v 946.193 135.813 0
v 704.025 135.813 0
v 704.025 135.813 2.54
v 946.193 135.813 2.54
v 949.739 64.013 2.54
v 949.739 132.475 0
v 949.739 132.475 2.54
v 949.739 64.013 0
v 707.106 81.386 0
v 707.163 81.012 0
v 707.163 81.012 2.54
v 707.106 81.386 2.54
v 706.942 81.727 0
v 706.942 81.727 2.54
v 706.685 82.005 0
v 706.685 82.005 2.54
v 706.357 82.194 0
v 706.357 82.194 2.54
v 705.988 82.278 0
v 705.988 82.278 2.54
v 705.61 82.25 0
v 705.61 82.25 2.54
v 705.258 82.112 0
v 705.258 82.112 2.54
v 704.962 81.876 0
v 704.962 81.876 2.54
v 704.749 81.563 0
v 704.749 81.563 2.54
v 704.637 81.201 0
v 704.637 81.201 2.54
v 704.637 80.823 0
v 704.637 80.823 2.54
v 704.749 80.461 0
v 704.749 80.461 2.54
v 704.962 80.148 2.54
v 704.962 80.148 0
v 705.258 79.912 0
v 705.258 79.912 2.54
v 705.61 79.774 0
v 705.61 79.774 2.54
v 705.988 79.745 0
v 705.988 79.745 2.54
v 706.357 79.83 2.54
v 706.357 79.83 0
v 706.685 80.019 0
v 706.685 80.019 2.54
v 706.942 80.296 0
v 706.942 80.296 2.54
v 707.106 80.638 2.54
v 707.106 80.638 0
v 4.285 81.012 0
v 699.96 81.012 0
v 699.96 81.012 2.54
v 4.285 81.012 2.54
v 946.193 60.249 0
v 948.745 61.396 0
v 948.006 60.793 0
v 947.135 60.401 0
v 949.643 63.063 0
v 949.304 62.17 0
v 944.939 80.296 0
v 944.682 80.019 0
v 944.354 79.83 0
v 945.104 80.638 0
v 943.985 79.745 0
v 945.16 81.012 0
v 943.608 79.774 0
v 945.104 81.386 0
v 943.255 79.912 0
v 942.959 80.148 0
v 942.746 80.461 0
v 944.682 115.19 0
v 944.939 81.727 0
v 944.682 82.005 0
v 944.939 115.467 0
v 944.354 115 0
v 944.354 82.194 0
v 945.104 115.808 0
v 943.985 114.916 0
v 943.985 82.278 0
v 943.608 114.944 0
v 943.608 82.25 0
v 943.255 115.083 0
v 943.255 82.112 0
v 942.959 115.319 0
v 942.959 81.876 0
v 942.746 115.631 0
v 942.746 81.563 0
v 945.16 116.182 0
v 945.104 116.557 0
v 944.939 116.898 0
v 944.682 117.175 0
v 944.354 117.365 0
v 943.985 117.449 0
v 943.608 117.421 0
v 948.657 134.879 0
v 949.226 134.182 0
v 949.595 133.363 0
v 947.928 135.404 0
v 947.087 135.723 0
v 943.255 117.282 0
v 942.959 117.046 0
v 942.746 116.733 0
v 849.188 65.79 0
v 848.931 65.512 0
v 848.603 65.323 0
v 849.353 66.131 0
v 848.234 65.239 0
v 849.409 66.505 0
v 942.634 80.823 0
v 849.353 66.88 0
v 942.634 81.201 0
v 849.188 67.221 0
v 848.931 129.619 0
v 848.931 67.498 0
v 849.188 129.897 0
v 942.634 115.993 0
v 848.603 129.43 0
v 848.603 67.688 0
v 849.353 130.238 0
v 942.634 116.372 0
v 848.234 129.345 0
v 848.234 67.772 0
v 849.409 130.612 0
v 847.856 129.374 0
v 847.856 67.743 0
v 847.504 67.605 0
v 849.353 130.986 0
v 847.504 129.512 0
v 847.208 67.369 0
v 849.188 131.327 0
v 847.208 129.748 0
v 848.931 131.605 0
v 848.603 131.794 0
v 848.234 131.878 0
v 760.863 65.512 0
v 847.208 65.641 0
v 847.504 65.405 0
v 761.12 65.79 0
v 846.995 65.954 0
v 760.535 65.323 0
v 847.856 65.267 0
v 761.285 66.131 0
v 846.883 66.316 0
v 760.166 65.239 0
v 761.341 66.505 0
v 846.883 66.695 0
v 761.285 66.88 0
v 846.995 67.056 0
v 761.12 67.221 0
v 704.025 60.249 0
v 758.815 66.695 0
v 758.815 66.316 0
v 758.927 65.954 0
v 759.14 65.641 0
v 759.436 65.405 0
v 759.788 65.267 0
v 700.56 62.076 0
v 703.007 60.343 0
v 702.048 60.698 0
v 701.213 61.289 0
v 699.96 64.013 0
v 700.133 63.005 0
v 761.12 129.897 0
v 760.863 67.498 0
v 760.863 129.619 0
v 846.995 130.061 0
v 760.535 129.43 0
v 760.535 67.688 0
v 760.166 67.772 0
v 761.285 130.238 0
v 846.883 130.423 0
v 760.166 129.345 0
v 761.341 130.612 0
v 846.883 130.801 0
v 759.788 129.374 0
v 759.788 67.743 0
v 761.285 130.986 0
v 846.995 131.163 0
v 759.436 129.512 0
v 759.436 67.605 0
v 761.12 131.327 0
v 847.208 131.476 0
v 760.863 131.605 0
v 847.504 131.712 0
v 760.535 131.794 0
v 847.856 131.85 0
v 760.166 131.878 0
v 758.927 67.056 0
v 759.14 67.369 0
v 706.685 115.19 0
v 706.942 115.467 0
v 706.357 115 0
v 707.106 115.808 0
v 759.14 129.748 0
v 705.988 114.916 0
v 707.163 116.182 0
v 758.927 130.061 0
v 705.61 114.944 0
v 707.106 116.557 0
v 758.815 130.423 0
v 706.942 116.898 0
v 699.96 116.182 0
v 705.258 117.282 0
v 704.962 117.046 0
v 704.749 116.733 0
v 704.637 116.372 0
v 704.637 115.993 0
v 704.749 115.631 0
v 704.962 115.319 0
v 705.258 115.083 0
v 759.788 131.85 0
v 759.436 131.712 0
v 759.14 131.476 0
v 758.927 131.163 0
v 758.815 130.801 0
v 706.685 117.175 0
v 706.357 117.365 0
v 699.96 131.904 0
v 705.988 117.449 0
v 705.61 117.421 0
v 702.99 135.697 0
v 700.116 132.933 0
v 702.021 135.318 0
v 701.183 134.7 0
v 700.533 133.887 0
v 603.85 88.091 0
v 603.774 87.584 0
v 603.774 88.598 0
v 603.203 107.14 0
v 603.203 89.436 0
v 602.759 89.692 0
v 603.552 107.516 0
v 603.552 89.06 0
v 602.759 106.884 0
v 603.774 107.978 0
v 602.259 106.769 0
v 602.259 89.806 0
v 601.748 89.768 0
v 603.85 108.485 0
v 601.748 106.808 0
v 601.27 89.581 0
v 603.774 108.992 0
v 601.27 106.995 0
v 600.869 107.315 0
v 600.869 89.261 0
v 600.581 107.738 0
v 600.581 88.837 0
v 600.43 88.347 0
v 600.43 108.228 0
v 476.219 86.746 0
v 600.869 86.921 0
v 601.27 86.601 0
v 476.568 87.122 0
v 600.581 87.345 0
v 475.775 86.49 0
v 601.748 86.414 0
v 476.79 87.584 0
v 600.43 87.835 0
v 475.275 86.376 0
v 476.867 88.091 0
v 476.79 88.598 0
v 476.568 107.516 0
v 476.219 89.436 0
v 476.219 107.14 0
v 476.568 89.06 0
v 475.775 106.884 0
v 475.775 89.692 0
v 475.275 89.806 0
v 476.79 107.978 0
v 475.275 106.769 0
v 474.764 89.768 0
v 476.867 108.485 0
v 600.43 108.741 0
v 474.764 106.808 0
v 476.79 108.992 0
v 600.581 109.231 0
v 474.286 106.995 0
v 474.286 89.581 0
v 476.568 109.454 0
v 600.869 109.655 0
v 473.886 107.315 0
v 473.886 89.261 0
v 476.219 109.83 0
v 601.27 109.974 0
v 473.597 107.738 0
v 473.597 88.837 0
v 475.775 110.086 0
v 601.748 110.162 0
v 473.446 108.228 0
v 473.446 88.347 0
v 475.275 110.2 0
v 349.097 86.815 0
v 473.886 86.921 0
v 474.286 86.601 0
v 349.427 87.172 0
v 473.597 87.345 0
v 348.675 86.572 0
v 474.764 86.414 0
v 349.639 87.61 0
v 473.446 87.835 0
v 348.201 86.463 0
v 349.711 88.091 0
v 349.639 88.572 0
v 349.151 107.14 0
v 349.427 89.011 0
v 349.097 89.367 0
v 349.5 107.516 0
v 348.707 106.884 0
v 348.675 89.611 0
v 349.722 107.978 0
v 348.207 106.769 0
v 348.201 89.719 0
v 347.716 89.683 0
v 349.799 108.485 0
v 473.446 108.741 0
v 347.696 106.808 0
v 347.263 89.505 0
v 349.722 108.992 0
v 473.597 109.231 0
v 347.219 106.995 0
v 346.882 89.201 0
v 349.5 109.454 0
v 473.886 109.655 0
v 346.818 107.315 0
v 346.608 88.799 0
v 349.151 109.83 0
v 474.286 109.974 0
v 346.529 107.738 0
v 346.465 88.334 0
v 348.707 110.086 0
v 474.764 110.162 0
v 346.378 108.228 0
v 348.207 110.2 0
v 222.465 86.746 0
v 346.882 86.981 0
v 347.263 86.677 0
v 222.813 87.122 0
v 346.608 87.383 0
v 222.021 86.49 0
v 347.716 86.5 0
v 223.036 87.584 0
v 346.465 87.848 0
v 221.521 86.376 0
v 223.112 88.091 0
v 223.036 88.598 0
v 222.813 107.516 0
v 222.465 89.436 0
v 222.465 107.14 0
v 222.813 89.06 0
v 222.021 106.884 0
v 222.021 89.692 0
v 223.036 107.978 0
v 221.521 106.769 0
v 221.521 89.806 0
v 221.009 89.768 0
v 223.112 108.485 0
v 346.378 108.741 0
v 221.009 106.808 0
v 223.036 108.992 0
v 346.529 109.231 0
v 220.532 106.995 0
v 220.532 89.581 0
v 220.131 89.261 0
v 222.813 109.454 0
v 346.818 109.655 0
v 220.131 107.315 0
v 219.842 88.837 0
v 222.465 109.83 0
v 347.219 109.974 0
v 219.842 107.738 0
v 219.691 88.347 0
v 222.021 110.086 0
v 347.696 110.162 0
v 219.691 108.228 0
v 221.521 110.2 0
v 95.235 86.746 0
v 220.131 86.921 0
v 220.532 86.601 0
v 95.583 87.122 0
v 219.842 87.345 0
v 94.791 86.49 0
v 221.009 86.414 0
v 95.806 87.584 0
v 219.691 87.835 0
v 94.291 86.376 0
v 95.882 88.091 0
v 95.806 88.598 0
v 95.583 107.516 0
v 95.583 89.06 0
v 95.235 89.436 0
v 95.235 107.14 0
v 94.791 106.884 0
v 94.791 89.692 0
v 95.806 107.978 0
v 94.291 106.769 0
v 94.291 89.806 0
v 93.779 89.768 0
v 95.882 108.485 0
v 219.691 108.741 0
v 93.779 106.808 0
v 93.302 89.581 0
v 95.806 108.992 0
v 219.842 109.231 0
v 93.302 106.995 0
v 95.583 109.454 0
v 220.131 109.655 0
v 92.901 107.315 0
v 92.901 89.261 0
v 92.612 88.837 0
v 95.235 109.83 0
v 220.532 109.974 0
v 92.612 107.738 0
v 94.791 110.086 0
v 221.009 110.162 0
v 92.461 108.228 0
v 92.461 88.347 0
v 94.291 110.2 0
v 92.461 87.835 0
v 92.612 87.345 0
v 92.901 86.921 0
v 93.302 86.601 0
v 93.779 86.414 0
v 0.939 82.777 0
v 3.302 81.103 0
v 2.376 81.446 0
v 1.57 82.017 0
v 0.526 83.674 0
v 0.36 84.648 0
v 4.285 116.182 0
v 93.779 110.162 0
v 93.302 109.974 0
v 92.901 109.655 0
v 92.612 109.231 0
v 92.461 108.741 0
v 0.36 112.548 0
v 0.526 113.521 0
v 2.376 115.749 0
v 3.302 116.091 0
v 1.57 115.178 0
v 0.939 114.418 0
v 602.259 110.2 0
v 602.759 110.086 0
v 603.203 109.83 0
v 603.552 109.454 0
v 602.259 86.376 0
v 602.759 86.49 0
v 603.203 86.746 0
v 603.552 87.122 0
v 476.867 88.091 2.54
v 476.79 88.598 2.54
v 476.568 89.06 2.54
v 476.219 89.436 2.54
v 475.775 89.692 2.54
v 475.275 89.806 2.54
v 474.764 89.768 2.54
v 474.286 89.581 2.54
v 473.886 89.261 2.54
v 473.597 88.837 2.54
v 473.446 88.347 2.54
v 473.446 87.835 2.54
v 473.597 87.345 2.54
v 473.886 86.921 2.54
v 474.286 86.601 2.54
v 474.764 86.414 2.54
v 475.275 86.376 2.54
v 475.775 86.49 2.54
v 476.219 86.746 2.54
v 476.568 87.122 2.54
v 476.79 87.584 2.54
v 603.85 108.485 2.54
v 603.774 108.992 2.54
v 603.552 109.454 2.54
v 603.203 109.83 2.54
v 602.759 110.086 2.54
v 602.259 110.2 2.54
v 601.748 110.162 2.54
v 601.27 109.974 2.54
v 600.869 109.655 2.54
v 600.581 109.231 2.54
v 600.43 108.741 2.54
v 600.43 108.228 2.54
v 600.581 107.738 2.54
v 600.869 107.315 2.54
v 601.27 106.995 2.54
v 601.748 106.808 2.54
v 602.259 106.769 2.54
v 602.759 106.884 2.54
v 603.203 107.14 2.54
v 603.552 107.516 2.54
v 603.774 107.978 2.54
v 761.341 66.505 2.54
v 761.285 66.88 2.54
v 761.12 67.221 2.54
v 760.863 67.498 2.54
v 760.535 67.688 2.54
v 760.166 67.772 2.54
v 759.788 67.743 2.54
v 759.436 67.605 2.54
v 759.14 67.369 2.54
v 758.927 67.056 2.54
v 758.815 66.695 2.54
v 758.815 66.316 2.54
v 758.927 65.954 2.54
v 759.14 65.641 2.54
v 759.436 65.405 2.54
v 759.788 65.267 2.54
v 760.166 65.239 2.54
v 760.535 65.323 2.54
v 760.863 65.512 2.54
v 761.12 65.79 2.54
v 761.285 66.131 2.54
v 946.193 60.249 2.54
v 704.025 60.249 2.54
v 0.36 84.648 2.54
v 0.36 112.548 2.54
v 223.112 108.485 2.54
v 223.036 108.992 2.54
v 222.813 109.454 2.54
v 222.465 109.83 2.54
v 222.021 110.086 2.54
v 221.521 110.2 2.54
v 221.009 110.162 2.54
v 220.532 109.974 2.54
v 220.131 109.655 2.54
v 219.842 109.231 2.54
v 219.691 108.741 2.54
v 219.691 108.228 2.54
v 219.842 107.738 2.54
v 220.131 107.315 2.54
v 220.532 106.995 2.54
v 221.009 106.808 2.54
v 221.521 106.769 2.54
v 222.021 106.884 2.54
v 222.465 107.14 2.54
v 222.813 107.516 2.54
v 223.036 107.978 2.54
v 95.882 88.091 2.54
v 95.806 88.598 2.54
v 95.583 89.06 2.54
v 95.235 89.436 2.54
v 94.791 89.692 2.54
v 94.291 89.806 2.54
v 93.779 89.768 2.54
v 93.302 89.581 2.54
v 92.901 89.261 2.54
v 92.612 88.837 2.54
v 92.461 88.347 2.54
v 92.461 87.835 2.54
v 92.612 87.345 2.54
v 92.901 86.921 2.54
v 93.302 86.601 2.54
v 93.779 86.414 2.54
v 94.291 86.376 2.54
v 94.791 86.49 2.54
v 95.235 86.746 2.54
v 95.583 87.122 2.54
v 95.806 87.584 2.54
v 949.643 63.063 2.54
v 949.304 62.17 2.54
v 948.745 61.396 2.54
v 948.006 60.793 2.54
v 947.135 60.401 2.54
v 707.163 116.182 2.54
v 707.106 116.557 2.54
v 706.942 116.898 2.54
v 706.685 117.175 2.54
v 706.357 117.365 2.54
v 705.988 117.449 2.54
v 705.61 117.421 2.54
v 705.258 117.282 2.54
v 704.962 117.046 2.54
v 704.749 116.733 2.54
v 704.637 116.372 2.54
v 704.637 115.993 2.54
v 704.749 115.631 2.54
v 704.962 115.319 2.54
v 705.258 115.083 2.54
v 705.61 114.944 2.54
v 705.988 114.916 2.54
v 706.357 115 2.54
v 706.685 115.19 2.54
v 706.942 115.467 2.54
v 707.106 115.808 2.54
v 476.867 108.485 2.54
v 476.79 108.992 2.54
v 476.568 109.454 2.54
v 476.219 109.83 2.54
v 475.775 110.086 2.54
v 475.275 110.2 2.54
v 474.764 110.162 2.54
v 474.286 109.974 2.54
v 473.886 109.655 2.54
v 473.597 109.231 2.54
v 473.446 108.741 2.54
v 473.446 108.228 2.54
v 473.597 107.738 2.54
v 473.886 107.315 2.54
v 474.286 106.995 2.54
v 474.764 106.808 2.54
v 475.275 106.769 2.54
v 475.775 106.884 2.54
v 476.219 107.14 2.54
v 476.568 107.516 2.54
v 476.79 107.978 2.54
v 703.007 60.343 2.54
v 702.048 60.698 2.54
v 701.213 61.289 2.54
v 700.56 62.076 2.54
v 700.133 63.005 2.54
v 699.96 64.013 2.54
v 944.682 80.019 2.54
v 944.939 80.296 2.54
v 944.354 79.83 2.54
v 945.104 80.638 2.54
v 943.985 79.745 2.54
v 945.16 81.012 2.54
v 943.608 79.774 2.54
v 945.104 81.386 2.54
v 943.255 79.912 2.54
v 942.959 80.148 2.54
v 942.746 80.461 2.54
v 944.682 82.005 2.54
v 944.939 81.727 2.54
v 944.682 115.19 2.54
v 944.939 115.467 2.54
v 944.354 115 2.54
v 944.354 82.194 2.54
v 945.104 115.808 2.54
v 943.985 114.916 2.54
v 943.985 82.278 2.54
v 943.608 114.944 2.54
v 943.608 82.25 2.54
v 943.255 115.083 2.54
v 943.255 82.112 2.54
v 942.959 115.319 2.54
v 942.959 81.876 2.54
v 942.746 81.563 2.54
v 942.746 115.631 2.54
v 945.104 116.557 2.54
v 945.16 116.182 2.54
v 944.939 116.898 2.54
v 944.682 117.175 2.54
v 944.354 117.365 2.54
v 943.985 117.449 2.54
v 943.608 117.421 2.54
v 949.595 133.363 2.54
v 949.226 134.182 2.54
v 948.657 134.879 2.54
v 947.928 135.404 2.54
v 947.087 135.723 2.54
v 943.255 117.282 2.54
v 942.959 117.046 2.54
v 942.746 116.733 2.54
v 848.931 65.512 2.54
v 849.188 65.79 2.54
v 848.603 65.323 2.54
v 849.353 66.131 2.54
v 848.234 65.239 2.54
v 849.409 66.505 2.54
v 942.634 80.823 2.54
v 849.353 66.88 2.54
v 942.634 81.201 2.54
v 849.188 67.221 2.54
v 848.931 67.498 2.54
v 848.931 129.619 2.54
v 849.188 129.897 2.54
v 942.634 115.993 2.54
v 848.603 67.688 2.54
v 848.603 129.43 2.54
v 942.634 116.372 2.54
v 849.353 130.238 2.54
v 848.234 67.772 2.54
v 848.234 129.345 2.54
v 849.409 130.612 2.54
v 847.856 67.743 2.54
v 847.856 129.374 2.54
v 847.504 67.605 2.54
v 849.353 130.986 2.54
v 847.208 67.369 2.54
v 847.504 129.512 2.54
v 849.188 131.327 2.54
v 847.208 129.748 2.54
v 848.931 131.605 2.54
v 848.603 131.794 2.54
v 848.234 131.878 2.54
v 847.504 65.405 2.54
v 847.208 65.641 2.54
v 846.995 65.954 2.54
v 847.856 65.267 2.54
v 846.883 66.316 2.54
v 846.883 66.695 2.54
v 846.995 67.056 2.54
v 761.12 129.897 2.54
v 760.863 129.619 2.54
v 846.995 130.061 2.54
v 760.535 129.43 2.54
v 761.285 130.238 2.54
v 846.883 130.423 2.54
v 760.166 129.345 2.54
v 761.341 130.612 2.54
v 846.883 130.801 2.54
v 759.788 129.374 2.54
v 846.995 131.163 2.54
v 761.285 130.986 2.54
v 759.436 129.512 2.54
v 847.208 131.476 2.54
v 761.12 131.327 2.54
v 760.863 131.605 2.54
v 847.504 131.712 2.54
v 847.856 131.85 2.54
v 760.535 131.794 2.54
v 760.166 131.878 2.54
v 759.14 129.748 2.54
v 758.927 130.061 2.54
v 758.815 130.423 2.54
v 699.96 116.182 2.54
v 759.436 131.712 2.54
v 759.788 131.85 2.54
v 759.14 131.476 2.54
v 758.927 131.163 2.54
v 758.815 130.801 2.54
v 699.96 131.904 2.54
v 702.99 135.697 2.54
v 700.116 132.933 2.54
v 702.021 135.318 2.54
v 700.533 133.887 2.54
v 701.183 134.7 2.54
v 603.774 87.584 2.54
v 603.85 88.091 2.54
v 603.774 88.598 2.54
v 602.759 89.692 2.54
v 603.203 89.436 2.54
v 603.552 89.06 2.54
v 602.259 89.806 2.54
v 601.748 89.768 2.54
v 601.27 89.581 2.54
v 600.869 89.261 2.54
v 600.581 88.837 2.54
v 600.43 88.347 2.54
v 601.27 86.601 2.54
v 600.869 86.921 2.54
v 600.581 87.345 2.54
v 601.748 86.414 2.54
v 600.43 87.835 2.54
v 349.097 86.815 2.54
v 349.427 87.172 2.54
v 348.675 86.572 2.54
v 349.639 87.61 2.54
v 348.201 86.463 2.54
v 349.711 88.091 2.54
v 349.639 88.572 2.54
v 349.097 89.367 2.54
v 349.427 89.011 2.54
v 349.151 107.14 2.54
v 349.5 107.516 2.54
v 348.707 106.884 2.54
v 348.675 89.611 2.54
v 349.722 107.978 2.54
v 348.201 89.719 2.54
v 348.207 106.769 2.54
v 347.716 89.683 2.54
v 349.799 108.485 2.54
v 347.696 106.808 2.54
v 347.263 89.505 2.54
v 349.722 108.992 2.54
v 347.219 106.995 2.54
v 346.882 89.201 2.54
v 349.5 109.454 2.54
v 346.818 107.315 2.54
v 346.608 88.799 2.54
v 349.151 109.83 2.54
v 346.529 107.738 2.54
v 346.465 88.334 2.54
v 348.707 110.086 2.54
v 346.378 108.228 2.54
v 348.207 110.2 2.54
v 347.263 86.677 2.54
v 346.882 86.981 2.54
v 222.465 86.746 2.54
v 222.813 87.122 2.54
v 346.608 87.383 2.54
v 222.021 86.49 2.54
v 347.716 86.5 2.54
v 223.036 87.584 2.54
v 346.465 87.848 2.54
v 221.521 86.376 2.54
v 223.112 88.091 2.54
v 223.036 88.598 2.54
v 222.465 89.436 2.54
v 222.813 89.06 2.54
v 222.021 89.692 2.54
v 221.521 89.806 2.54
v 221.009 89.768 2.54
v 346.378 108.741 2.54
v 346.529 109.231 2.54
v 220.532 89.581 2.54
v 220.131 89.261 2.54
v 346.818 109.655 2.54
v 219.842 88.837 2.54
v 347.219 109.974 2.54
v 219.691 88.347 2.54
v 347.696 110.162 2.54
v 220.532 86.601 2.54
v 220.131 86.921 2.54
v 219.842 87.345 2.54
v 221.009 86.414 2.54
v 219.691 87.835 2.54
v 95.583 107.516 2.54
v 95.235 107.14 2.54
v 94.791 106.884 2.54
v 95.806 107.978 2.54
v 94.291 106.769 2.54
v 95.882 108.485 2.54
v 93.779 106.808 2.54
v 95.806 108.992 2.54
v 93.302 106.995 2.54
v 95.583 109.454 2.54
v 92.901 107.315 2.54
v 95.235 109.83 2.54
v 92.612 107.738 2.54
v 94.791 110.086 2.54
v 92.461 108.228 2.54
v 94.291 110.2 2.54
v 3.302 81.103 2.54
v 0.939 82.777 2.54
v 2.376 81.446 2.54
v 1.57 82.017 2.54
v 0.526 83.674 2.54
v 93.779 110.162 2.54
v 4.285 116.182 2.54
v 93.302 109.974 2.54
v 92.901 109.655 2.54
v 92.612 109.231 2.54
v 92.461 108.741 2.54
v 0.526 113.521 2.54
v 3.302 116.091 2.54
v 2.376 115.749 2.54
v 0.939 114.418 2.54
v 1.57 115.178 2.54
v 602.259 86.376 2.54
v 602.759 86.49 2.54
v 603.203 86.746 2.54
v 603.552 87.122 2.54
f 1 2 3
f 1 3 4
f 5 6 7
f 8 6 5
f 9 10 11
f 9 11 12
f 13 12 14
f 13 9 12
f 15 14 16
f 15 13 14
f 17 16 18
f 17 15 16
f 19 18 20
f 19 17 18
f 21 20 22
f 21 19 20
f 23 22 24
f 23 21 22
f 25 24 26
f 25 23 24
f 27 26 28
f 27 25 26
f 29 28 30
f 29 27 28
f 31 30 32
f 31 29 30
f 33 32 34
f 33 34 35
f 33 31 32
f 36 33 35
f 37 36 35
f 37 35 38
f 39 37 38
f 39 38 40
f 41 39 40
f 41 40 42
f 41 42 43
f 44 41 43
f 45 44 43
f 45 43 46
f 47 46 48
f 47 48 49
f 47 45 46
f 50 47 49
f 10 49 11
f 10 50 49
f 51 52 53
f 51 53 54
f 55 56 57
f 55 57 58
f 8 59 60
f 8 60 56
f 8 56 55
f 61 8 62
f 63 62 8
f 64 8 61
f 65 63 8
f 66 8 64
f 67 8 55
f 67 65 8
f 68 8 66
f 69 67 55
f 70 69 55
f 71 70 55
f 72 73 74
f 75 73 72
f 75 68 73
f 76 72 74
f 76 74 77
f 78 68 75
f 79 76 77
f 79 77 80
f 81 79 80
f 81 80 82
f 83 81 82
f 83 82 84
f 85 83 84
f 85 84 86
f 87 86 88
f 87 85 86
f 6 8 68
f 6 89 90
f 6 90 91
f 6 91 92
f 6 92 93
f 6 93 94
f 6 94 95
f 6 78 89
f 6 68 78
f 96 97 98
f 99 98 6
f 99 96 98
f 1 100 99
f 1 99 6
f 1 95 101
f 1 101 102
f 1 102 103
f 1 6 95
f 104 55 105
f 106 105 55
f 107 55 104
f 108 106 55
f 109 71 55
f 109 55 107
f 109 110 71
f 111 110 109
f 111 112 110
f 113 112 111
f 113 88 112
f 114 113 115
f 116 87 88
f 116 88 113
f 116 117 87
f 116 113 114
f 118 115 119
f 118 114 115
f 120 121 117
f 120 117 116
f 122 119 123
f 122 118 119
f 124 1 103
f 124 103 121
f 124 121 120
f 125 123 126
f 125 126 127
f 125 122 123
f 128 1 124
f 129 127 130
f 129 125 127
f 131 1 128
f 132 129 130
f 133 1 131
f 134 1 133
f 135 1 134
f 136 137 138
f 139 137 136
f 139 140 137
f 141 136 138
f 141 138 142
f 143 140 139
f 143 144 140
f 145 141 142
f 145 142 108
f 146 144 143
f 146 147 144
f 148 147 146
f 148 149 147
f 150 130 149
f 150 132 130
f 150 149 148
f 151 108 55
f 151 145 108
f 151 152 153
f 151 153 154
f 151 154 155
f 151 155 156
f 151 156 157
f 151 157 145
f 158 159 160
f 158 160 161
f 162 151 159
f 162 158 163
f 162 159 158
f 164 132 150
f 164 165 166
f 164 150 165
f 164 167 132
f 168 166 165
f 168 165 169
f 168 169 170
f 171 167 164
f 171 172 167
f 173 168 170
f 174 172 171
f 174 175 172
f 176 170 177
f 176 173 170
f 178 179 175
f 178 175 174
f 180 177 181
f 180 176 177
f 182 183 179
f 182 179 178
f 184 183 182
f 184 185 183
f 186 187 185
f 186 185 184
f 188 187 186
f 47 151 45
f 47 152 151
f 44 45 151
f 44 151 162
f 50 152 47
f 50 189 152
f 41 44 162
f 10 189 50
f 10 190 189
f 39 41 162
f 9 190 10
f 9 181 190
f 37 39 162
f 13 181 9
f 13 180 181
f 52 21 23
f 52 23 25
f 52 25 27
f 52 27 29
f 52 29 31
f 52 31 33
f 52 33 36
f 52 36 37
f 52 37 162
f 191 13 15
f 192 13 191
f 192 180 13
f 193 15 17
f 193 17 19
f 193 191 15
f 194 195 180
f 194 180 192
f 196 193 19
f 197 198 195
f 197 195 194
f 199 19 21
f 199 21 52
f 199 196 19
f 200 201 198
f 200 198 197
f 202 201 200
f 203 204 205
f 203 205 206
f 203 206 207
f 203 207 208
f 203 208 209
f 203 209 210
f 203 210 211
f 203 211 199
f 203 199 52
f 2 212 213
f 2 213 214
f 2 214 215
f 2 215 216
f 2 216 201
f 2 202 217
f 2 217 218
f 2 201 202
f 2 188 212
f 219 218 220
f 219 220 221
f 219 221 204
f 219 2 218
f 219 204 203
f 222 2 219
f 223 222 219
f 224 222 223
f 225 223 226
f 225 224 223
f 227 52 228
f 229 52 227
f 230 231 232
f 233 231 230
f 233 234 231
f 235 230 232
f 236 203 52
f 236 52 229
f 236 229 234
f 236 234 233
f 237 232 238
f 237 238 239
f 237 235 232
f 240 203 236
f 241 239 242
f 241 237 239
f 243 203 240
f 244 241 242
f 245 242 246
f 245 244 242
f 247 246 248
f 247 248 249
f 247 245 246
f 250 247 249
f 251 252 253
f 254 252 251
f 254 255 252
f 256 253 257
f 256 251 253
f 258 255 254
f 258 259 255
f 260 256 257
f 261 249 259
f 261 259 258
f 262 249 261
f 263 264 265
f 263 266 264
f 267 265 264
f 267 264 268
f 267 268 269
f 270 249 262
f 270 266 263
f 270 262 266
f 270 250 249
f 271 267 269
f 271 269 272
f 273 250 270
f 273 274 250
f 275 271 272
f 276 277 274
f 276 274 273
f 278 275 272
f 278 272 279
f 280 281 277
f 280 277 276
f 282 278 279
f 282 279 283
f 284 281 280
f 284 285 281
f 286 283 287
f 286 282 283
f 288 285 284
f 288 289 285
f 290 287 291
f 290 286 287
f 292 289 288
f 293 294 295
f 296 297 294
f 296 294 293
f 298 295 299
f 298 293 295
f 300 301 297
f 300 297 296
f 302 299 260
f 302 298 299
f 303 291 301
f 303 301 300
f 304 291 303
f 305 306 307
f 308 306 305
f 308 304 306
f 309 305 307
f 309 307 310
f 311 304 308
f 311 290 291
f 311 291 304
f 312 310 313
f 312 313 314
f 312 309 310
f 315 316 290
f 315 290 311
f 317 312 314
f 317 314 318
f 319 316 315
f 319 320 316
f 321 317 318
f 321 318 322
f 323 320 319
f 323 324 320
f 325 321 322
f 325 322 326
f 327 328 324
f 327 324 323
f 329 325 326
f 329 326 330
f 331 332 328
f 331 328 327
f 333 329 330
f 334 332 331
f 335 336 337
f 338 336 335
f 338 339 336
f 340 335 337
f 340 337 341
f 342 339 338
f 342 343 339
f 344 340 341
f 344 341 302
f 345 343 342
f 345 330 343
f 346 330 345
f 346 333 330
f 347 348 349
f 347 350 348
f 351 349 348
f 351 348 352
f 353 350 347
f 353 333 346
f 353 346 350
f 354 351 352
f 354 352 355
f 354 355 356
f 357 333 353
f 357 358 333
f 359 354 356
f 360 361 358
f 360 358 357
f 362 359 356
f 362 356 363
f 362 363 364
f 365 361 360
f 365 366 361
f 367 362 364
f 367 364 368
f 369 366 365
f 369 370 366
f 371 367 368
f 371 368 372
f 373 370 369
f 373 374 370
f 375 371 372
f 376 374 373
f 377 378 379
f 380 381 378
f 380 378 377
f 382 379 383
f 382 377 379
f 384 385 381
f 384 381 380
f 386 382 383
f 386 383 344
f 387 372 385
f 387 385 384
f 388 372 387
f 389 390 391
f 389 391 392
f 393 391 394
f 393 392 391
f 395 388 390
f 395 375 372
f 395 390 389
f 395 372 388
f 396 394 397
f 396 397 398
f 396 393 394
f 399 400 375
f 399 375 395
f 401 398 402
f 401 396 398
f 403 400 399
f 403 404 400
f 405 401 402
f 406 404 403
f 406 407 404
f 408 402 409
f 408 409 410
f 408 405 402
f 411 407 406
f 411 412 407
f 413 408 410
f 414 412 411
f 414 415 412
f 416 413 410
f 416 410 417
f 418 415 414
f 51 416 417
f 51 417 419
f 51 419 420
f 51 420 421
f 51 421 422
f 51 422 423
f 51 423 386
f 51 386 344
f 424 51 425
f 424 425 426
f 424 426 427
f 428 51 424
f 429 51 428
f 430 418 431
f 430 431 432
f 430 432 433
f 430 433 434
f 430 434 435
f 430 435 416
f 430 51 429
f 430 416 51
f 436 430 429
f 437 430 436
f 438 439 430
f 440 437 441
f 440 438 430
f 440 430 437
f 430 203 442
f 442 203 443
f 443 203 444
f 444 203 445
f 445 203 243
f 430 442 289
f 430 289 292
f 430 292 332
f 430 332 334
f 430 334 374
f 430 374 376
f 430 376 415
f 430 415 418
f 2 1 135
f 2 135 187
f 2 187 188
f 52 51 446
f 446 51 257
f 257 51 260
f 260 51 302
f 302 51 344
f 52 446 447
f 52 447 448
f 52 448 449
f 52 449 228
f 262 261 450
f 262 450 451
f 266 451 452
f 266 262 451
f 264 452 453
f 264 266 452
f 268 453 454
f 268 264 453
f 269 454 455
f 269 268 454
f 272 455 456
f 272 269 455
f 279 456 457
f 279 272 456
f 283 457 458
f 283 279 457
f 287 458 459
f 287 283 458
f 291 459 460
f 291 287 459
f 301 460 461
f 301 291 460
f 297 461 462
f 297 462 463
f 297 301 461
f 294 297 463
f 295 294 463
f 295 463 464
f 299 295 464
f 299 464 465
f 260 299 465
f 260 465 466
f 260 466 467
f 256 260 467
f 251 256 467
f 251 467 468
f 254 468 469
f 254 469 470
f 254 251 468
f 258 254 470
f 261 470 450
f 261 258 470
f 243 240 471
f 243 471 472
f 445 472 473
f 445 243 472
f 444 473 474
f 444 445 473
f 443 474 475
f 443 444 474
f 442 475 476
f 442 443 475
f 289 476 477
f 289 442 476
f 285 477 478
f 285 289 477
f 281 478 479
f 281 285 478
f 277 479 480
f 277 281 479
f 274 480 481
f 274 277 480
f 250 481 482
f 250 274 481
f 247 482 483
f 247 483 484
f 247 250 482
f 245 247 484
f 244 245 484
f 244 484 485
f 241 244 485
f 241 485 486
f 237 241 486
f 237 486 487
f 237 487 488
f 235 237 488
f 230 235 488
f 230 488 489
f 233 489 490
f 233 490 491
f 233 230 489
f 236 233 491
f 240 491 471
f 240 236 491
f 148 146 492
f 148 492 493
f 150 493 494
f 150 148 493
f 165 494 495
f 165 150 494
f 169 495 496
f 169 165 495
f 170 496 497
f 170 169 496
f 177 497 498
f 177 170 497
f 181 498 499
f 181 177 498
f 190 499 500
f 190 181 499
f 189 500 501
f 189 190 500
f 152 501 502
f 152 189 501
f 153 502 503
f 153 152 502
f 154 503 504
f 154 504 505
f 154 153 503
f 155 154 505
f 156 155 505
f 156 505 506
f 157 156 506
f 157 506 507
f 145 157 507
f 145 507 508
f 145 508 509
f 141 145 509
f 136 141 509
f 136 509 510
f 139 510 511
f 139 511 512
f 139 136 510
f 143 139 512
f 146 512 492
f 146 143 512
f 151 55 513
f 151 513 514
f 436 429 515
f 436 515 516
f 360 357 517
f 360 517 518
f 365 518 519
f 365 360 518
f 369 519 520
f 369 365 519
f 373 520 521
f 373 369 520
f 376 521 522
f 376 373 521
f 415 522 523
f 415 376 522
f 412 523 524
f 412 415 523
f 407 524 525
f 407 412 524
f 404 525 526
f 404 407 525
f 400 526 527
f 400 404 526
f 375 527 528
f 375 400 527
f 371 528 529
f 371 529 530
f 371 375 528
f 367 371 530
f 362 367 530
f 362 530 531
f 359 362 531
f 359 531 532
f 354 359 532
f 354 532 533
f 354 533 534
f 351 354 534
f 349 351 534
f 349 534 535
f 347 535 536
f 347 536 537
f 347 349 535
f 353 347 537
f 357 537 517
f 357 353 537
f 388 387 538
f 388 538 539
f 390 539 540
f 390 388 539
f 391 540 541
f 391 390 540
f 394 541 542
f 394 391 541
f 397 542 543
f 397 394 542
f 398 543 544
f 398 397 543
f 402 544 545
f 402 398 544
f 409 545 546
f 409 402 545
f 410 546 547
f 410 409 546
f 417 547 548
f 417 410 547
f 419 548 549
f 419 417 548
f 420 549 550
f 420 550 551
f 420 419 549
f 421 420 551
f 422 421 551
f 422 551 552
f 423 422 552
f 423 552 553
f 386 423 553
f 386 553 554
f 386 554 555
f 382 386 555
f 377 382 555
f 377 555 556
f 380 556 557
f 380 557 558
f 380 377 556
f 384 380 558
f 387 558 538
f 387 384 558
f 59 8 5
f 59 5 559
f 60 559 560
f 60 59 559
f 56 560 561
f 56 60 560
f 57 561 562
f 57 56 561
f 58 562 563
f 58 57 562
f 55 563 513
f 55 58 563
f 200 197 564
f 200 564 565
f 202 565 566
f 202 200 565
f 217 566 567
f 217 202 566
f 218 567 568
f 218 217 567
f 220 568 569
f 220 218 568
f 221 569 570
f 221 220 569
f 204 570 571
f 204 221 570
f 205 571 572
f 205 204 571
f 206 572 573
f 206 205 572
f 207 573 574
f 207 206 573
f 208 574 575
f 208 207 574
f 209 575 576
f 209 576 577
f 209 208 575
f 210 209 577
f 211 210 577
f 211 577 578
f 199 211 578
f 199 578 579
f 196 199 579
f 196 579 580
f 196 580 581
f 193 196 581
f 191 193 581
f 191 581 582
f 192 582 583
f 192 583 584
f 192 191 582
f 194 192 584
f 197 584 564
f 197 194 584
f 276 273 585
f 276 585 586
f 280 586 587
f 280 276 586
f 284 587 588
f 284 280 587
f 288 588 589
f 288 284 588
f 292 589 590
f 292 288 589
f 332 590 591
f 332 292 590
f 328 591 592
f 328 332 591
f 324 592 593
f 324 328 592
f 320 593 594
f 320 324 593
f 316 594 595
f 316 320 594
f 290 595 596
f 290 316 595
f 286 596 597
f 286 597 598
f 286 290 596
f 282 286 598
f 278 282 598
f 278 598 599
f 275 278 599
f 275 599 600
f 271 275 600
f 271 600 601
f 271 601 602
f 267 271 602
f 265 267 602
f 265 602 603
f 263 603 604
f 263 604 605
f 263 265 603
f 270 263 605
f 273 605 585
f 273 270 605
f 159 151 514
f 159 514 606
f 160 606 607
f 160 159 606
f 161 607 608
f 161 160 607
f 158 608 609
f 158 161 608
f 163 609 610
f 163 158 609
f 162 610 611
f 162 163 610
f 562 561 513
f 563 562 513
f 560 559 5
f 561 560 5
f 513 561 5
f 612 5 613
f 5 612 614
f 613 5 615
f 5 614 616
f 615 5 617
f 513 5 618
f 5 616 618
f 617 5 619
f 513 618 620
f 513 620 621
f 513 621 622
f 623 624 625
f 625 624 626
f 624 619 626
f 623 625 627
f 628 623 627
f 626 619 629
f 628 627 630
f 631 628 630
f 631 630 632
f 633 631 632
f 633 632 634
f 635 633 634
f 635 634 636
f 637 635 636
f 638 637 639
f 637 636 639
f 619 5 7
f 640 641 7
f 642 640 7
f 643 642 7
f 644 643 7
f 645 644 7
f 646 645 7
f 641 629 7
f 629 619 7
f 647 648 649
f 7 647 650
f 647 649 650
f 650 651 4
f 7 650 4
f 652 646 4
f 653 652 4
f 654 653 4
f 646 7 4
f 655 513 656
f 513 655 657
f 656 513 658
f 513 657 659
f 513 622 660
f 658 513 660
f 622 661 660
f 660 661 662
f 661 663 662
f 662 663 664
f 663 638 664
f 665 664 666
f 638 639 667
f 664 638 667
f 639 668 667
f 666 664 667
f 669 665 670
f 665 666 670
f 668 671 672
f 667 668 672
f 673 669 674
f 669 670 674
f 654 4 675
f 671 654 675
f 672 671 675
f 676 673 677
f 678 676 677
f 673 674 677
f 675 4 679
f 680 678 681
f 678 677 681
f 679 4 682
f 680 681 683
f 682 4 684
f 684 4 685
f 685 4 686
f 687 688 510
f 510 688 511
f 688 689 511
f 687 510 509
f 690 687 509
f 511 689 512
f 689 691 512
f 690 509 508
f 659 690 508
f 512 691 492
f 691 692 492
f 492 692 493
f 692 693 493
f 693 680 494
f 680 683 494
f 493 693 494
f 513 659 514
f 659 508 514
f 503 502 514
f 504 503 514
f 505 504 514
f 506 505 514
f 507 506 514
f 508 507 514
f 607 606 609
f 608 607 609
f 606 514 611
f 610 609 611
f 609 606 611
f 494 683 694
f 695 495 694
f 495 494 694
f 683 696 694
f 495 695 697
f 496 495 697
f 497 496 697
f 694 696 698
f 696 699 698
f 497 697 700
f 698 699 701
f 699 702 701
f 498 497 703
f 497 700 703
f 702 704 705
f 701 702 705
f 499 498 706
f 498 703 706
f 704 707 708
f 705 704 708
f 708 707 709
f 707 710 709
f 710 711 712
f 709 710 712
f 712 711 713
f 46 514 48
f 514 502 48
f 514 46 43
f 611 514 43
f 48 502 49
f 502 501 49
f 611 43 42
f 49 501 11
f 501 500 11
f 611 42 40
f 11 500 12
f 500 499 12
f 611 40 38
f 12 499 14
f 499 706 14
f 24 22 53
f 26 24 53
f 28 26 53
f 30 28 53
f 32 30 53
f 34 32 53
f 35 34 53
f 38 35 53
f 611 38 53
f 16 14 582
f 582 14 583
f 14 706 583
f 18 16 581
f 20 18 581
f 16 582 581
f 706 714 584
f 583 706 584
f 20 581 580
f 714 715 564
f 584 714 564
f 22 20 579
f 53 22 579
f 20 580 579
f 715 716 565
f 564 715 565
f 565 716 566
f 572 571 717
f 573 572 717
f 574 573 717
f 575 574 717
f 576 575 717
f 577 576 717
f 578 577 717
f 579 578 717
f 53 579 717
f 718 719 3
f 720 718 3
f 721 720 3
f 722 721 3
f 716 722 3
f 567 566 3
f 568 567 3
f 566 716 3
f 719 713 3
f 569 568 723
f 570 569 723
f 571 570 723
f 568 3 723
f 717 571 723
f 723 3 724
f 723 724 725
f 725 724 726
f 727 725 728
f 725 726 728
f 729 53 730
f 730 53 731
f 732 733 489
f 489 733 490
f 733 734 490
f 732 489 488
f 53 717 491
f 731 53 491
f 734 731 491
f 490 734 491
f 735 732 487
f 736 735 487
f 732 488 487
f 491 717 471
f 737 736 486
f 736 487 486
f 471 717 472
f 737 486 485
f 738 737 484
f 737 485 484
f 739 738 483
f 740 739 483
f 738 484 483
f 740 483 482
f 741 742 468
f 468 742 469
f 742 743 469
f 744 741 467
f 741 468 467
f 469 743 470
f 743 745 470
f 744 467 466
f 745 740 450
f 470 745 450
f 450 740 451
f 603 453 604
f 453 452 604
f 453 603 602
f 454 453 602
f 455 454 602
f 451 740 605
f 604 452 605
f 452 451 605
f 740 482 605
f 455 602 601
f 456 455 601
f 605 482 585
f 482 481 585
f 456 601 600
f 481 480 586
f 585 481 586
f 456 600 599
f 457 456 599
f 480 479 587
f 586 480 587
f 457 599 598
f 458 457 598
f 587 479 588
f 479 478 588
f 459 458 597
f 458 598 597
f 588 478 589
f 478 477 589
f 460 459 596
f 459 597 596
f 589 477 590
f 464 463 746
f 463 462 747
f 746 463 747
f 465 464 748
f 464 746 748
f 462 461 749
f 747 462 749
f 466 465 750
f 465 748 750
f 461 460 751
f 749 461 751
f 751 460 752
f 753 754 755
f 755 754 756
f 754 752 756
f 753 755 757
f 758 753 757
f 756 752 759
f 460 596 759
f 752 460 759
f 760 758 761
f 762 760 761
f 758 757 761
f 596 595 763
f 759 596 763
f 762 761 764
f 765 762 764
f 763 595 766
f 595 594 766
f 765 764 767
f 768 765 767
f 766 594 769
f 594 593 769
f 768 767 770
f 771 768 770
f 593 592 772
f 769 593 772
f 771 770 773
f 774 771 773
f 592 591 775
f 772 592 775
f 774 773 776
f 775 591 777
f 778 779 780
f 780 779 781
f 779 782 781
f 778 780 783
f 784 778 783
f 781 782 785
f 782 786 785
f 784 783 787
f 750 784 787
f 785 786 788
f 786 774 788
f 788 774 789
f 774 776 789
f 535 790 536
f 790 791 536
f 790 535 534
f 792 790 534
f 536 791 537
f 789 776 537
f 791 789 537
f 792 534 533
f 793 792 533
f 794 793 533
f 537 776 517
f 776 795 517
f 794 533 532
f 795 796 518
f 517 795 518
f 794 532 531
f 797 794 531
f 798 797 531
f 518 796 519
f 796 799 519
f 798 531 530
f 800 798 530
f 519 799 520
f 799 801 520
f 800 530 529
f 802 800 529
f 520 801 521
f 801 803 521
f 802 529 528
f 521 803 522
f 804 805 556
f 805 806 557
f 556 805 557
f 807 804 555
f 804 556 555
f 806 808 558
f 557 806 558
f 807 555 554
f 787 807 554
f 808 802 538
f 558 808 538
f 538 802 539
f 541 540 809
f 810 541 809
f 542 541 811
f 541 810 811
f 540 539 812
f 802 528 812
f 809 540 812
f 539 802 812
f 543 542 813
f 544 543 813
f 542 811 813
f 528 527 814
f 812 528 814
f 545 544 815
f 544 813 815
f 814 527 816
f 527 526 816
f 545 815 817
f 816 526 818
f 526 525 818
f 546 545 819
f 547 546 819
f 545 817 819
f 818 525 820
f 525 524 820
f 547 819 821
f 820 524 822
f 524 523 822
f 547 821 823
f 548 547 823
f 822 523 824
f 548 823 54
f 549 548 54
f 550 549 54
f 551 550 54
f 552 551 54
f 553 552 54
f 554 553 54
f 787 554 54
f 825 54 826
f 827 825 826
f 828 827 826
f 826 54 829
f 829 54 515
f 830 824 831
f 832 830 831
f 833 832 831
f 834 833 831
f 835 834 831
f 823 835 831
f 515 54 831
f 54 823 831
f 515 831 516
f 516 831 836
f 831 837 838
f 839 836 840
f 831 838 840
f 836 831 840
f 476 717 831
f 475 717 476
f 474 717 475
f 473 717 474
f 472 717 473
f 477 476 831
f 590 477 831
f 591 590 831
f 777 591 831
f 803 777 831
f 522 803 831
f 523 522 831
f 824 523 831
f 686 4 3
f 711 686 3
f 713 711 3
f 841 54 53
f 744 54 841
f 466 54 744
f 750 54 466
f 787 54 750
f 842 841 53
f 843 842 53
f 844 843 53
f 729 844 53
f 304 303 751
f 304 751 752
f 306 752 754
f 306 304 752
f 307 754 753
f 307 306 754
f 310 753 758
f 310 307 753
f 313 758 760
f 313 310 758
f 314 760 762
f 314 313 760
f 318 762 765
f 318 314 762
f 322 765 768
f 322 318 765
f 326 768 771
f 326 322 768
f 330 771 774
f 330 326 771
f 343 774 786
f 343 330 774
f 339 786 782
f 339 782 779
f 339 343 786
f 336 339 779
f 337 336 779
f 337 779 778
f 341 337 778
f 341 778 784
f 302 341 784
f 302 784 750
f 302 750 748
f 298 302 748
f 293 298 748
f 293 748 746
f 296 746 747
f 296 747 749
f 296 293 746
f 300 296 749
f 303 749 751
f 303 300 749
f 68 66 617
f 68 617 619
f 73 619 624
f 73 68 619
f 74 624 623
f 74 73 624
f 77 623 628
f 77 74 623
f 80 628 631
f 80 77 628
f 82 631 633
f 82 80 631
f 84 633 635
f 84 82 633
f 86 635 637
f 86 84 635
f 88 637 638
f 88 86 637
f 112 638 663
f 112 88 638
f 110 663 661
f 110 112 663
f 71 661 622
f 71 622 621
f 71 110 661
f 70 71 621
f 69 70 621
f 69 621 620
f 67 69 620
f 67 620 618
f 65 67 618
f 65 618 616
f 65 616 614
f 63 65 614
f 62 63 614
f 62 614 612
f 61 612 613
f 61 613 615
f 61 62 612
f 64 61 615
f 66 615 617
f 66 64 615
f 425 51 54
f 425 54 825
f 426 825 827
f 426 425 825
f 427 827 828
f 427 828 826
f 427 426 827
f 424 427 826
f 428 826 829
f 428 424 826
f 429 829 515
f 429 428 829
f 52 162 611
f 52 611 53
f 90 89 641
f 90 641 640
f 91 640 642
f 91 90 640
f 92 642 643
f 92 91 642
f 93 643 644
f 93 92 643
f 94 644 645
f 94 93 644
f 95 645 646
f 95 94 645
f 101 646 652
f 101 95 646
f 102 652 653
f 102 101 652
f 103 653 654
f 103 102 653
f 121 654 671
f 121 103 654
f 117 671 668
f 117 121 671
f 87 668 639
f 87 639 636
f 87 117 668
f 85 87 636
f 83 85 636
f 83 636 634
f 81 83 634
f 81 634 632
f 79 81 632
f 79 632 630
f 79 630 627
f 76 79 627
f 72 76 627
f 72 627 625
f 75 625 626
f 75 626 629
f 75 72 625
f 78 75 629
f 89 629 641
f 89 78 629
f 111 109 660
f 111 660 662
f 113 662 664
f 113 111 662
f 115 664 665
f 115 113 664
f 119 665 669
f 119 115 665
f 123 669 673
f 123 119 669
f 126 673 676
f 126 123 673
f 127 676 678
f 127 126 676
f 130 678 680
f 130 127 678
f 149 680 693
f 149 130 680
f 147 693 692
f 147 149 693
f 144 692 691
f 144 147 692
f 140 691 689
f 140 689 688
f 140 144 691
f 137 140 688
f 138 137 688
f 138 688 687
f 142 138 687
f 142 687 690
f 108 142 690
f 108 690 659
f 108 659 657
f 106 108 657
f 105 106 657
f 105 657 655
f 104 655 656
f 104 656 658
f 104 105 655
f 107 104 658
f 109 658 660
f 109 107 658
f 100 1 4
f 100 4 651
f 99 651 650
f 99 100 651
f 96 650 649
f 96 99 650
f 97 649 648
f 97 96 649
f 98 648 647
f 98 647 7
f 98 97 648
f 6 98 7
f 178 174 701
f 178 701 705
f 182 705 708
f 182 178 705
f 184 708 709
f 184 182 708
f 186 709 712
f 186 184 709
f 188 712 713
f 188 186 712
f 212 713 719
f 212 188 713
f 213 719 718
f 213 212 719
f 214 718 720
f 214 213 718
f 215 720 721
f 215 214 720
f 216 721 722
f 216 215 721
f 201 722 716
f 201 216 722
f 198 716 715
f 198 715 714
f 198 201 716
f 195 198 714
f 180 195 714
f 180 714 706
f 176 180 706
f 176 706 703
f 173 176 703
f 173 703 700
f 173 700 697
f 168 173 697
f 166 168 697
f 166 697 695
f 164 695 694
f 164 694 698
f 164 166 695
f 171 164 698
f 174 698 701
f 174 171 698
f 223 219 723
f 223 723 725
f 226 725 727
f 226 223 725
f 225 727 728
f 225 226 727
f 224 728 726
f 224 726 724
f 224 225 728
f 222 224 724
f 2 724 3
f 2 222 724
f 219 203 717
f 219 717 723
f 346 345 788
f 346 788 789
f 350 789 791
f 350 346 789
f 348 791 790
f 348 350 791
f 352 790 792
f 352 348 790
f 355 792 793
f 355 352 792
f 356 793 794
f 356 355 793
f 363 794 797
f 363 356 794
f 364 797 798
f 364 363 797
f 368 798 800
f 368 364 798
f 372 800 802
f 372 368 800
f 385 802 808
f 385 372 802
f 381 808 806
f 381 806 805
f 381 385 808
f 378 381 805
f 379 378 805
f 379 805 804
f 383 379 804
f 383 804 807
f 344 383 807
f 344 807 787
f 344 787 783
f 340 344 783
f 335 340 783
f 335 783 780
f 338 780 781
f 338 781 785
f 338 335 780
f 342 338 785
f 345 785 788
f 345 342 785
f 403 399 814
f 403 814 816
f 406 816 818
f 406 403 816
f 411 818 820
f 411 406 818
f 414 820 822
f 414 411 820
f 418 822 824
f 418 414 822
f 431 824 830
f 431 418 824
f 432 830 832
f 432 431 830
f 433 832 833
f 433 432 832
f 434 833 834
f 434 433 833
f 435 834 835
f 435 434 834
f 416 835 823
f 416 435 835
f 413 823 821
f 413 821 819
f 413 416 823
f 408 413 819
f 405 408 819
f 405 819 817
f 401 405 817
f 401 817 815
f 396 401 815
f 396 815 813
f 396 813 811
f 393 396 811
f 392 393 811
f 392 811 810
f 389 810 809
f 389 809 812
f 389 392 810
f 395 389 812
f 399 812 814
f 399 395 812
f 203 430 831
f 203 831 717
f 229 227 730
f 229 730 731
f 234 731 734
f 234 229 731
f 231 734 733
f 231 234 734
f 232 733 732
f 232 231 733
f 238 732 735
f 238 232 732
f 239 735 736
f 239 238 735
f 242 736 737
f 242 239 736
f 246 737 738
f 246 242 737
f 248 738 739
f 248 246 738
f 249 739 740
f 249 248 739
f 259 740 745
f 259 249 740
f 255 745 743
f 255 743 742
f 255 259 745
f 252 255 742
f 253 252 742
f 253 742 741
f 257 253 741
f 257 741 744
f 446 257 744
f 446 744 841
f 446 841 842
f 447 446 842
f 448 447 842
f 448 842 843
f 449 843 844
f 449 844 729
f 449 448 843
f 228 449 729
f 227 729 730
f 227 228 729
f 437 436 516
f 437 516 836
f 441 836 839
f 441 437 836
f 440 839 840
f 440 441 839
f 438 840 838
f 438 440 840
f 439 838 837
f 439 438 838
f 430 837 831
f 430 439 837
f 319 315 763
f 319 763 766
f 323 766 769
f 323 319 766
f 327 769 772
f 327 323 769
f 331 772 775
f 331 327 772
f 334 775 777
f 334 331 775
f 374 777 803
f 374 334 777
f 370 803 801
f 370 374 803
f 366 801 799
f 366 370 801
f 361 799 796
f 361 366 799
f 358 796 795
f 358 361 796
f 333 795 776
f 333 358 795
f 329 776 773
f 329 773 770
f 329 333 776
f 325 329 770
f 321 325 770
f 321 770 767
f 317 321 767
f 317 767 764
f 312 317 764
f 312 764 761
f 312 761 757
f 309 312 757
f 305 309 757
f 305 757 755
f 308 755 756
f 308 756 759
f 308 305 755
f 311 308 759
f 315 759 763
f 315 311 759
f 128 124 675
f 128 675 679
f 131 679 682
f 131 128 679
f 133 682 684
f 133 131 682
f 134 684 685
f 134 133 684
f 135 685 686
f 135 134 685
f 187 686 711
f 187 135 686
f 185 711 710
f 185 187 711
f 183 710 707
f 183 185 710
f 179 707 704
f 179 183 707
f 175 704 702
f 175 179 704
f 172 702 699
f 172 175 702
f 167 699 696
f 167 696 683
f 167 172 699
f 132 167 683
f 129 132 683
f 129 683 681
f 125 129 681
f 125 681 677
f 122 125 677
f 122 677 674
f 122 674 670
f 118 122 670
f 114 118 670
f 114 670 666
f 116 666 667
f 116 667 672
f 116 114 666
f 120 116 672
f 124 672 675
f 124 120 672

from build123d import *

# Parameters (mm, degrees)
SKETCH1_R           = 1.720095417
SKETCH1_R_2         = 1.632335783
SKETCH1_R_3         = 1.27
BOSS_EXTRUDE1_DEPTH = 2.54


with BuildPart() as part:
    # Sketch1 → Boss-Extrude1 (new body)
    with BuildSketch(Plane.XY):
        with BuildLine():
            Line((0.359622665, 112.547896558), (0.359622665, 84.647626996))
            ThreePointArc((0.359622665, 84.647626996), (1.569547298, 82.016705042), (4.285435965, 81.011908201))
            Line((4.285435965, 81.011908201), (699.960441306, 81.011908201))
            Line((699.960441306, 81.011908201), (699.960441306, 64.012598058))
            ThreePointArc((699.960441306, 64.012598058), (701.213068629, 61.288906282), (704.024750828, 60.24870663))
            Line((704.024750828, 60.24870663), (946.192785632, 60.24870663))
            ThreePointArc((946.192785632, 60.24870663), (948.74540471, 61.39621374), (949.738968911, 64.012598058))
            Line((949.738968911, 64.012598058), (949.738968911, 132.475411377))
            ThreePointArc((949.738968911, 132.475411377), (948.657072186, 134.878542119), (946.192785632, 135.812795653))
            Line((946.192785632, 135.812795653), (704.024750828, 135.812795653))
            ThreePointArc((704.024750828, 135.812795653), (701.183091811, 134.700225562), (699.960441306, 131.904163347))
            Line((699.960441306, 131.904163347), (699.960441306, 116.18243367))
            Line((699.960441306, 116.18243367), (4.285435965, 116.18243367))
            ThreePointArc((4.285435965, 116.18243367), (1.569792033, 115.17822767), (0.359622665, 112.547896558))
        make_face()
        with Locations((94.1622142, 88.091107164)):
            Circle(SKETCH1_R, mode=Mode.SUBTRACT)
        with Locations((221.392126764, 88.091107164)):
            Circle(SKETCH1_R, mode=Mode.SUBTRACT)
        with Locations((348.078760153, 88.091107164)):
            Circle(SKETCH1_R_2, mode=Mode.SUBTRACT)
        with Locations((760.070975046, 66.505299661)):
            Circle(SKETCH1_R_3, mode=Mode.SUBTRACT)
        with Locations((848.138968911, 66.505299661)):
            Circle(SKETCH1_R_3, mode=Mode.SUBTRACT)
        with Locations((475.146430575, 88.091107164)):
            Circle(SKETCH1_R, mode=Mode.SUBTRACT)
        with Locations((705.892847696, 81.011908201)):
            Circle(SKETCH1_R_3, mode=Mode.SUBTRACT)
        with Locations((602.130384222, 88.091107164)):
            Circle(SKETCH1_R, mode=Mode.SUBTRACT)
        with Locations((943.890172073, 81.011908201)):
            Circle(SKETCH1_R_3, mode=Mode.SUBTRACT)
        with Locations((94.1622142, 108.484732819)):
            Circle(SKETCH1_R, mode=Mode.SUBTRACT)
        with Locations((221.392126764, 108.484732819)):
            Circle(SKETCH1_R, mode=Mode.SUBTRACT)
        with Locations((348.078760153, 108.484732819)):
            Circle(SKETCH1_R, mode=Mode.SUBTRACT)
        with Locations((475.146430575, 108.484732819)):
            Circle(SKETCH1_R, mode=Mode.SUBTRACT)
        with Locations((602.130384222, 108.484732819)):
            Circle(SKETCH1_R, mode=Mode.SUBTRACT)
        with Locations((705.892847696, 116.18243367)):
            Circle(SKETCH1_R_3, mode=Mode.SUBTRACT)
        with Locations((943.890172073, 116.18243367)):
            Circle(SKETCH1_R_3, mode=Mode.SUBTRACT)
        with Locations((760.070975046, 130.611938178)):
            Circle(SKETCH1_R_3, mode=Mode.SUBTRACT)
        with Locations((848.138968911, 130.611938178)):
            Circle(SKETCH1_R_3, mode=Mode.SUBTRACT)
    extrude(amount=BOSS_EXTRUDE1_DEPTH)


solid = part.part
